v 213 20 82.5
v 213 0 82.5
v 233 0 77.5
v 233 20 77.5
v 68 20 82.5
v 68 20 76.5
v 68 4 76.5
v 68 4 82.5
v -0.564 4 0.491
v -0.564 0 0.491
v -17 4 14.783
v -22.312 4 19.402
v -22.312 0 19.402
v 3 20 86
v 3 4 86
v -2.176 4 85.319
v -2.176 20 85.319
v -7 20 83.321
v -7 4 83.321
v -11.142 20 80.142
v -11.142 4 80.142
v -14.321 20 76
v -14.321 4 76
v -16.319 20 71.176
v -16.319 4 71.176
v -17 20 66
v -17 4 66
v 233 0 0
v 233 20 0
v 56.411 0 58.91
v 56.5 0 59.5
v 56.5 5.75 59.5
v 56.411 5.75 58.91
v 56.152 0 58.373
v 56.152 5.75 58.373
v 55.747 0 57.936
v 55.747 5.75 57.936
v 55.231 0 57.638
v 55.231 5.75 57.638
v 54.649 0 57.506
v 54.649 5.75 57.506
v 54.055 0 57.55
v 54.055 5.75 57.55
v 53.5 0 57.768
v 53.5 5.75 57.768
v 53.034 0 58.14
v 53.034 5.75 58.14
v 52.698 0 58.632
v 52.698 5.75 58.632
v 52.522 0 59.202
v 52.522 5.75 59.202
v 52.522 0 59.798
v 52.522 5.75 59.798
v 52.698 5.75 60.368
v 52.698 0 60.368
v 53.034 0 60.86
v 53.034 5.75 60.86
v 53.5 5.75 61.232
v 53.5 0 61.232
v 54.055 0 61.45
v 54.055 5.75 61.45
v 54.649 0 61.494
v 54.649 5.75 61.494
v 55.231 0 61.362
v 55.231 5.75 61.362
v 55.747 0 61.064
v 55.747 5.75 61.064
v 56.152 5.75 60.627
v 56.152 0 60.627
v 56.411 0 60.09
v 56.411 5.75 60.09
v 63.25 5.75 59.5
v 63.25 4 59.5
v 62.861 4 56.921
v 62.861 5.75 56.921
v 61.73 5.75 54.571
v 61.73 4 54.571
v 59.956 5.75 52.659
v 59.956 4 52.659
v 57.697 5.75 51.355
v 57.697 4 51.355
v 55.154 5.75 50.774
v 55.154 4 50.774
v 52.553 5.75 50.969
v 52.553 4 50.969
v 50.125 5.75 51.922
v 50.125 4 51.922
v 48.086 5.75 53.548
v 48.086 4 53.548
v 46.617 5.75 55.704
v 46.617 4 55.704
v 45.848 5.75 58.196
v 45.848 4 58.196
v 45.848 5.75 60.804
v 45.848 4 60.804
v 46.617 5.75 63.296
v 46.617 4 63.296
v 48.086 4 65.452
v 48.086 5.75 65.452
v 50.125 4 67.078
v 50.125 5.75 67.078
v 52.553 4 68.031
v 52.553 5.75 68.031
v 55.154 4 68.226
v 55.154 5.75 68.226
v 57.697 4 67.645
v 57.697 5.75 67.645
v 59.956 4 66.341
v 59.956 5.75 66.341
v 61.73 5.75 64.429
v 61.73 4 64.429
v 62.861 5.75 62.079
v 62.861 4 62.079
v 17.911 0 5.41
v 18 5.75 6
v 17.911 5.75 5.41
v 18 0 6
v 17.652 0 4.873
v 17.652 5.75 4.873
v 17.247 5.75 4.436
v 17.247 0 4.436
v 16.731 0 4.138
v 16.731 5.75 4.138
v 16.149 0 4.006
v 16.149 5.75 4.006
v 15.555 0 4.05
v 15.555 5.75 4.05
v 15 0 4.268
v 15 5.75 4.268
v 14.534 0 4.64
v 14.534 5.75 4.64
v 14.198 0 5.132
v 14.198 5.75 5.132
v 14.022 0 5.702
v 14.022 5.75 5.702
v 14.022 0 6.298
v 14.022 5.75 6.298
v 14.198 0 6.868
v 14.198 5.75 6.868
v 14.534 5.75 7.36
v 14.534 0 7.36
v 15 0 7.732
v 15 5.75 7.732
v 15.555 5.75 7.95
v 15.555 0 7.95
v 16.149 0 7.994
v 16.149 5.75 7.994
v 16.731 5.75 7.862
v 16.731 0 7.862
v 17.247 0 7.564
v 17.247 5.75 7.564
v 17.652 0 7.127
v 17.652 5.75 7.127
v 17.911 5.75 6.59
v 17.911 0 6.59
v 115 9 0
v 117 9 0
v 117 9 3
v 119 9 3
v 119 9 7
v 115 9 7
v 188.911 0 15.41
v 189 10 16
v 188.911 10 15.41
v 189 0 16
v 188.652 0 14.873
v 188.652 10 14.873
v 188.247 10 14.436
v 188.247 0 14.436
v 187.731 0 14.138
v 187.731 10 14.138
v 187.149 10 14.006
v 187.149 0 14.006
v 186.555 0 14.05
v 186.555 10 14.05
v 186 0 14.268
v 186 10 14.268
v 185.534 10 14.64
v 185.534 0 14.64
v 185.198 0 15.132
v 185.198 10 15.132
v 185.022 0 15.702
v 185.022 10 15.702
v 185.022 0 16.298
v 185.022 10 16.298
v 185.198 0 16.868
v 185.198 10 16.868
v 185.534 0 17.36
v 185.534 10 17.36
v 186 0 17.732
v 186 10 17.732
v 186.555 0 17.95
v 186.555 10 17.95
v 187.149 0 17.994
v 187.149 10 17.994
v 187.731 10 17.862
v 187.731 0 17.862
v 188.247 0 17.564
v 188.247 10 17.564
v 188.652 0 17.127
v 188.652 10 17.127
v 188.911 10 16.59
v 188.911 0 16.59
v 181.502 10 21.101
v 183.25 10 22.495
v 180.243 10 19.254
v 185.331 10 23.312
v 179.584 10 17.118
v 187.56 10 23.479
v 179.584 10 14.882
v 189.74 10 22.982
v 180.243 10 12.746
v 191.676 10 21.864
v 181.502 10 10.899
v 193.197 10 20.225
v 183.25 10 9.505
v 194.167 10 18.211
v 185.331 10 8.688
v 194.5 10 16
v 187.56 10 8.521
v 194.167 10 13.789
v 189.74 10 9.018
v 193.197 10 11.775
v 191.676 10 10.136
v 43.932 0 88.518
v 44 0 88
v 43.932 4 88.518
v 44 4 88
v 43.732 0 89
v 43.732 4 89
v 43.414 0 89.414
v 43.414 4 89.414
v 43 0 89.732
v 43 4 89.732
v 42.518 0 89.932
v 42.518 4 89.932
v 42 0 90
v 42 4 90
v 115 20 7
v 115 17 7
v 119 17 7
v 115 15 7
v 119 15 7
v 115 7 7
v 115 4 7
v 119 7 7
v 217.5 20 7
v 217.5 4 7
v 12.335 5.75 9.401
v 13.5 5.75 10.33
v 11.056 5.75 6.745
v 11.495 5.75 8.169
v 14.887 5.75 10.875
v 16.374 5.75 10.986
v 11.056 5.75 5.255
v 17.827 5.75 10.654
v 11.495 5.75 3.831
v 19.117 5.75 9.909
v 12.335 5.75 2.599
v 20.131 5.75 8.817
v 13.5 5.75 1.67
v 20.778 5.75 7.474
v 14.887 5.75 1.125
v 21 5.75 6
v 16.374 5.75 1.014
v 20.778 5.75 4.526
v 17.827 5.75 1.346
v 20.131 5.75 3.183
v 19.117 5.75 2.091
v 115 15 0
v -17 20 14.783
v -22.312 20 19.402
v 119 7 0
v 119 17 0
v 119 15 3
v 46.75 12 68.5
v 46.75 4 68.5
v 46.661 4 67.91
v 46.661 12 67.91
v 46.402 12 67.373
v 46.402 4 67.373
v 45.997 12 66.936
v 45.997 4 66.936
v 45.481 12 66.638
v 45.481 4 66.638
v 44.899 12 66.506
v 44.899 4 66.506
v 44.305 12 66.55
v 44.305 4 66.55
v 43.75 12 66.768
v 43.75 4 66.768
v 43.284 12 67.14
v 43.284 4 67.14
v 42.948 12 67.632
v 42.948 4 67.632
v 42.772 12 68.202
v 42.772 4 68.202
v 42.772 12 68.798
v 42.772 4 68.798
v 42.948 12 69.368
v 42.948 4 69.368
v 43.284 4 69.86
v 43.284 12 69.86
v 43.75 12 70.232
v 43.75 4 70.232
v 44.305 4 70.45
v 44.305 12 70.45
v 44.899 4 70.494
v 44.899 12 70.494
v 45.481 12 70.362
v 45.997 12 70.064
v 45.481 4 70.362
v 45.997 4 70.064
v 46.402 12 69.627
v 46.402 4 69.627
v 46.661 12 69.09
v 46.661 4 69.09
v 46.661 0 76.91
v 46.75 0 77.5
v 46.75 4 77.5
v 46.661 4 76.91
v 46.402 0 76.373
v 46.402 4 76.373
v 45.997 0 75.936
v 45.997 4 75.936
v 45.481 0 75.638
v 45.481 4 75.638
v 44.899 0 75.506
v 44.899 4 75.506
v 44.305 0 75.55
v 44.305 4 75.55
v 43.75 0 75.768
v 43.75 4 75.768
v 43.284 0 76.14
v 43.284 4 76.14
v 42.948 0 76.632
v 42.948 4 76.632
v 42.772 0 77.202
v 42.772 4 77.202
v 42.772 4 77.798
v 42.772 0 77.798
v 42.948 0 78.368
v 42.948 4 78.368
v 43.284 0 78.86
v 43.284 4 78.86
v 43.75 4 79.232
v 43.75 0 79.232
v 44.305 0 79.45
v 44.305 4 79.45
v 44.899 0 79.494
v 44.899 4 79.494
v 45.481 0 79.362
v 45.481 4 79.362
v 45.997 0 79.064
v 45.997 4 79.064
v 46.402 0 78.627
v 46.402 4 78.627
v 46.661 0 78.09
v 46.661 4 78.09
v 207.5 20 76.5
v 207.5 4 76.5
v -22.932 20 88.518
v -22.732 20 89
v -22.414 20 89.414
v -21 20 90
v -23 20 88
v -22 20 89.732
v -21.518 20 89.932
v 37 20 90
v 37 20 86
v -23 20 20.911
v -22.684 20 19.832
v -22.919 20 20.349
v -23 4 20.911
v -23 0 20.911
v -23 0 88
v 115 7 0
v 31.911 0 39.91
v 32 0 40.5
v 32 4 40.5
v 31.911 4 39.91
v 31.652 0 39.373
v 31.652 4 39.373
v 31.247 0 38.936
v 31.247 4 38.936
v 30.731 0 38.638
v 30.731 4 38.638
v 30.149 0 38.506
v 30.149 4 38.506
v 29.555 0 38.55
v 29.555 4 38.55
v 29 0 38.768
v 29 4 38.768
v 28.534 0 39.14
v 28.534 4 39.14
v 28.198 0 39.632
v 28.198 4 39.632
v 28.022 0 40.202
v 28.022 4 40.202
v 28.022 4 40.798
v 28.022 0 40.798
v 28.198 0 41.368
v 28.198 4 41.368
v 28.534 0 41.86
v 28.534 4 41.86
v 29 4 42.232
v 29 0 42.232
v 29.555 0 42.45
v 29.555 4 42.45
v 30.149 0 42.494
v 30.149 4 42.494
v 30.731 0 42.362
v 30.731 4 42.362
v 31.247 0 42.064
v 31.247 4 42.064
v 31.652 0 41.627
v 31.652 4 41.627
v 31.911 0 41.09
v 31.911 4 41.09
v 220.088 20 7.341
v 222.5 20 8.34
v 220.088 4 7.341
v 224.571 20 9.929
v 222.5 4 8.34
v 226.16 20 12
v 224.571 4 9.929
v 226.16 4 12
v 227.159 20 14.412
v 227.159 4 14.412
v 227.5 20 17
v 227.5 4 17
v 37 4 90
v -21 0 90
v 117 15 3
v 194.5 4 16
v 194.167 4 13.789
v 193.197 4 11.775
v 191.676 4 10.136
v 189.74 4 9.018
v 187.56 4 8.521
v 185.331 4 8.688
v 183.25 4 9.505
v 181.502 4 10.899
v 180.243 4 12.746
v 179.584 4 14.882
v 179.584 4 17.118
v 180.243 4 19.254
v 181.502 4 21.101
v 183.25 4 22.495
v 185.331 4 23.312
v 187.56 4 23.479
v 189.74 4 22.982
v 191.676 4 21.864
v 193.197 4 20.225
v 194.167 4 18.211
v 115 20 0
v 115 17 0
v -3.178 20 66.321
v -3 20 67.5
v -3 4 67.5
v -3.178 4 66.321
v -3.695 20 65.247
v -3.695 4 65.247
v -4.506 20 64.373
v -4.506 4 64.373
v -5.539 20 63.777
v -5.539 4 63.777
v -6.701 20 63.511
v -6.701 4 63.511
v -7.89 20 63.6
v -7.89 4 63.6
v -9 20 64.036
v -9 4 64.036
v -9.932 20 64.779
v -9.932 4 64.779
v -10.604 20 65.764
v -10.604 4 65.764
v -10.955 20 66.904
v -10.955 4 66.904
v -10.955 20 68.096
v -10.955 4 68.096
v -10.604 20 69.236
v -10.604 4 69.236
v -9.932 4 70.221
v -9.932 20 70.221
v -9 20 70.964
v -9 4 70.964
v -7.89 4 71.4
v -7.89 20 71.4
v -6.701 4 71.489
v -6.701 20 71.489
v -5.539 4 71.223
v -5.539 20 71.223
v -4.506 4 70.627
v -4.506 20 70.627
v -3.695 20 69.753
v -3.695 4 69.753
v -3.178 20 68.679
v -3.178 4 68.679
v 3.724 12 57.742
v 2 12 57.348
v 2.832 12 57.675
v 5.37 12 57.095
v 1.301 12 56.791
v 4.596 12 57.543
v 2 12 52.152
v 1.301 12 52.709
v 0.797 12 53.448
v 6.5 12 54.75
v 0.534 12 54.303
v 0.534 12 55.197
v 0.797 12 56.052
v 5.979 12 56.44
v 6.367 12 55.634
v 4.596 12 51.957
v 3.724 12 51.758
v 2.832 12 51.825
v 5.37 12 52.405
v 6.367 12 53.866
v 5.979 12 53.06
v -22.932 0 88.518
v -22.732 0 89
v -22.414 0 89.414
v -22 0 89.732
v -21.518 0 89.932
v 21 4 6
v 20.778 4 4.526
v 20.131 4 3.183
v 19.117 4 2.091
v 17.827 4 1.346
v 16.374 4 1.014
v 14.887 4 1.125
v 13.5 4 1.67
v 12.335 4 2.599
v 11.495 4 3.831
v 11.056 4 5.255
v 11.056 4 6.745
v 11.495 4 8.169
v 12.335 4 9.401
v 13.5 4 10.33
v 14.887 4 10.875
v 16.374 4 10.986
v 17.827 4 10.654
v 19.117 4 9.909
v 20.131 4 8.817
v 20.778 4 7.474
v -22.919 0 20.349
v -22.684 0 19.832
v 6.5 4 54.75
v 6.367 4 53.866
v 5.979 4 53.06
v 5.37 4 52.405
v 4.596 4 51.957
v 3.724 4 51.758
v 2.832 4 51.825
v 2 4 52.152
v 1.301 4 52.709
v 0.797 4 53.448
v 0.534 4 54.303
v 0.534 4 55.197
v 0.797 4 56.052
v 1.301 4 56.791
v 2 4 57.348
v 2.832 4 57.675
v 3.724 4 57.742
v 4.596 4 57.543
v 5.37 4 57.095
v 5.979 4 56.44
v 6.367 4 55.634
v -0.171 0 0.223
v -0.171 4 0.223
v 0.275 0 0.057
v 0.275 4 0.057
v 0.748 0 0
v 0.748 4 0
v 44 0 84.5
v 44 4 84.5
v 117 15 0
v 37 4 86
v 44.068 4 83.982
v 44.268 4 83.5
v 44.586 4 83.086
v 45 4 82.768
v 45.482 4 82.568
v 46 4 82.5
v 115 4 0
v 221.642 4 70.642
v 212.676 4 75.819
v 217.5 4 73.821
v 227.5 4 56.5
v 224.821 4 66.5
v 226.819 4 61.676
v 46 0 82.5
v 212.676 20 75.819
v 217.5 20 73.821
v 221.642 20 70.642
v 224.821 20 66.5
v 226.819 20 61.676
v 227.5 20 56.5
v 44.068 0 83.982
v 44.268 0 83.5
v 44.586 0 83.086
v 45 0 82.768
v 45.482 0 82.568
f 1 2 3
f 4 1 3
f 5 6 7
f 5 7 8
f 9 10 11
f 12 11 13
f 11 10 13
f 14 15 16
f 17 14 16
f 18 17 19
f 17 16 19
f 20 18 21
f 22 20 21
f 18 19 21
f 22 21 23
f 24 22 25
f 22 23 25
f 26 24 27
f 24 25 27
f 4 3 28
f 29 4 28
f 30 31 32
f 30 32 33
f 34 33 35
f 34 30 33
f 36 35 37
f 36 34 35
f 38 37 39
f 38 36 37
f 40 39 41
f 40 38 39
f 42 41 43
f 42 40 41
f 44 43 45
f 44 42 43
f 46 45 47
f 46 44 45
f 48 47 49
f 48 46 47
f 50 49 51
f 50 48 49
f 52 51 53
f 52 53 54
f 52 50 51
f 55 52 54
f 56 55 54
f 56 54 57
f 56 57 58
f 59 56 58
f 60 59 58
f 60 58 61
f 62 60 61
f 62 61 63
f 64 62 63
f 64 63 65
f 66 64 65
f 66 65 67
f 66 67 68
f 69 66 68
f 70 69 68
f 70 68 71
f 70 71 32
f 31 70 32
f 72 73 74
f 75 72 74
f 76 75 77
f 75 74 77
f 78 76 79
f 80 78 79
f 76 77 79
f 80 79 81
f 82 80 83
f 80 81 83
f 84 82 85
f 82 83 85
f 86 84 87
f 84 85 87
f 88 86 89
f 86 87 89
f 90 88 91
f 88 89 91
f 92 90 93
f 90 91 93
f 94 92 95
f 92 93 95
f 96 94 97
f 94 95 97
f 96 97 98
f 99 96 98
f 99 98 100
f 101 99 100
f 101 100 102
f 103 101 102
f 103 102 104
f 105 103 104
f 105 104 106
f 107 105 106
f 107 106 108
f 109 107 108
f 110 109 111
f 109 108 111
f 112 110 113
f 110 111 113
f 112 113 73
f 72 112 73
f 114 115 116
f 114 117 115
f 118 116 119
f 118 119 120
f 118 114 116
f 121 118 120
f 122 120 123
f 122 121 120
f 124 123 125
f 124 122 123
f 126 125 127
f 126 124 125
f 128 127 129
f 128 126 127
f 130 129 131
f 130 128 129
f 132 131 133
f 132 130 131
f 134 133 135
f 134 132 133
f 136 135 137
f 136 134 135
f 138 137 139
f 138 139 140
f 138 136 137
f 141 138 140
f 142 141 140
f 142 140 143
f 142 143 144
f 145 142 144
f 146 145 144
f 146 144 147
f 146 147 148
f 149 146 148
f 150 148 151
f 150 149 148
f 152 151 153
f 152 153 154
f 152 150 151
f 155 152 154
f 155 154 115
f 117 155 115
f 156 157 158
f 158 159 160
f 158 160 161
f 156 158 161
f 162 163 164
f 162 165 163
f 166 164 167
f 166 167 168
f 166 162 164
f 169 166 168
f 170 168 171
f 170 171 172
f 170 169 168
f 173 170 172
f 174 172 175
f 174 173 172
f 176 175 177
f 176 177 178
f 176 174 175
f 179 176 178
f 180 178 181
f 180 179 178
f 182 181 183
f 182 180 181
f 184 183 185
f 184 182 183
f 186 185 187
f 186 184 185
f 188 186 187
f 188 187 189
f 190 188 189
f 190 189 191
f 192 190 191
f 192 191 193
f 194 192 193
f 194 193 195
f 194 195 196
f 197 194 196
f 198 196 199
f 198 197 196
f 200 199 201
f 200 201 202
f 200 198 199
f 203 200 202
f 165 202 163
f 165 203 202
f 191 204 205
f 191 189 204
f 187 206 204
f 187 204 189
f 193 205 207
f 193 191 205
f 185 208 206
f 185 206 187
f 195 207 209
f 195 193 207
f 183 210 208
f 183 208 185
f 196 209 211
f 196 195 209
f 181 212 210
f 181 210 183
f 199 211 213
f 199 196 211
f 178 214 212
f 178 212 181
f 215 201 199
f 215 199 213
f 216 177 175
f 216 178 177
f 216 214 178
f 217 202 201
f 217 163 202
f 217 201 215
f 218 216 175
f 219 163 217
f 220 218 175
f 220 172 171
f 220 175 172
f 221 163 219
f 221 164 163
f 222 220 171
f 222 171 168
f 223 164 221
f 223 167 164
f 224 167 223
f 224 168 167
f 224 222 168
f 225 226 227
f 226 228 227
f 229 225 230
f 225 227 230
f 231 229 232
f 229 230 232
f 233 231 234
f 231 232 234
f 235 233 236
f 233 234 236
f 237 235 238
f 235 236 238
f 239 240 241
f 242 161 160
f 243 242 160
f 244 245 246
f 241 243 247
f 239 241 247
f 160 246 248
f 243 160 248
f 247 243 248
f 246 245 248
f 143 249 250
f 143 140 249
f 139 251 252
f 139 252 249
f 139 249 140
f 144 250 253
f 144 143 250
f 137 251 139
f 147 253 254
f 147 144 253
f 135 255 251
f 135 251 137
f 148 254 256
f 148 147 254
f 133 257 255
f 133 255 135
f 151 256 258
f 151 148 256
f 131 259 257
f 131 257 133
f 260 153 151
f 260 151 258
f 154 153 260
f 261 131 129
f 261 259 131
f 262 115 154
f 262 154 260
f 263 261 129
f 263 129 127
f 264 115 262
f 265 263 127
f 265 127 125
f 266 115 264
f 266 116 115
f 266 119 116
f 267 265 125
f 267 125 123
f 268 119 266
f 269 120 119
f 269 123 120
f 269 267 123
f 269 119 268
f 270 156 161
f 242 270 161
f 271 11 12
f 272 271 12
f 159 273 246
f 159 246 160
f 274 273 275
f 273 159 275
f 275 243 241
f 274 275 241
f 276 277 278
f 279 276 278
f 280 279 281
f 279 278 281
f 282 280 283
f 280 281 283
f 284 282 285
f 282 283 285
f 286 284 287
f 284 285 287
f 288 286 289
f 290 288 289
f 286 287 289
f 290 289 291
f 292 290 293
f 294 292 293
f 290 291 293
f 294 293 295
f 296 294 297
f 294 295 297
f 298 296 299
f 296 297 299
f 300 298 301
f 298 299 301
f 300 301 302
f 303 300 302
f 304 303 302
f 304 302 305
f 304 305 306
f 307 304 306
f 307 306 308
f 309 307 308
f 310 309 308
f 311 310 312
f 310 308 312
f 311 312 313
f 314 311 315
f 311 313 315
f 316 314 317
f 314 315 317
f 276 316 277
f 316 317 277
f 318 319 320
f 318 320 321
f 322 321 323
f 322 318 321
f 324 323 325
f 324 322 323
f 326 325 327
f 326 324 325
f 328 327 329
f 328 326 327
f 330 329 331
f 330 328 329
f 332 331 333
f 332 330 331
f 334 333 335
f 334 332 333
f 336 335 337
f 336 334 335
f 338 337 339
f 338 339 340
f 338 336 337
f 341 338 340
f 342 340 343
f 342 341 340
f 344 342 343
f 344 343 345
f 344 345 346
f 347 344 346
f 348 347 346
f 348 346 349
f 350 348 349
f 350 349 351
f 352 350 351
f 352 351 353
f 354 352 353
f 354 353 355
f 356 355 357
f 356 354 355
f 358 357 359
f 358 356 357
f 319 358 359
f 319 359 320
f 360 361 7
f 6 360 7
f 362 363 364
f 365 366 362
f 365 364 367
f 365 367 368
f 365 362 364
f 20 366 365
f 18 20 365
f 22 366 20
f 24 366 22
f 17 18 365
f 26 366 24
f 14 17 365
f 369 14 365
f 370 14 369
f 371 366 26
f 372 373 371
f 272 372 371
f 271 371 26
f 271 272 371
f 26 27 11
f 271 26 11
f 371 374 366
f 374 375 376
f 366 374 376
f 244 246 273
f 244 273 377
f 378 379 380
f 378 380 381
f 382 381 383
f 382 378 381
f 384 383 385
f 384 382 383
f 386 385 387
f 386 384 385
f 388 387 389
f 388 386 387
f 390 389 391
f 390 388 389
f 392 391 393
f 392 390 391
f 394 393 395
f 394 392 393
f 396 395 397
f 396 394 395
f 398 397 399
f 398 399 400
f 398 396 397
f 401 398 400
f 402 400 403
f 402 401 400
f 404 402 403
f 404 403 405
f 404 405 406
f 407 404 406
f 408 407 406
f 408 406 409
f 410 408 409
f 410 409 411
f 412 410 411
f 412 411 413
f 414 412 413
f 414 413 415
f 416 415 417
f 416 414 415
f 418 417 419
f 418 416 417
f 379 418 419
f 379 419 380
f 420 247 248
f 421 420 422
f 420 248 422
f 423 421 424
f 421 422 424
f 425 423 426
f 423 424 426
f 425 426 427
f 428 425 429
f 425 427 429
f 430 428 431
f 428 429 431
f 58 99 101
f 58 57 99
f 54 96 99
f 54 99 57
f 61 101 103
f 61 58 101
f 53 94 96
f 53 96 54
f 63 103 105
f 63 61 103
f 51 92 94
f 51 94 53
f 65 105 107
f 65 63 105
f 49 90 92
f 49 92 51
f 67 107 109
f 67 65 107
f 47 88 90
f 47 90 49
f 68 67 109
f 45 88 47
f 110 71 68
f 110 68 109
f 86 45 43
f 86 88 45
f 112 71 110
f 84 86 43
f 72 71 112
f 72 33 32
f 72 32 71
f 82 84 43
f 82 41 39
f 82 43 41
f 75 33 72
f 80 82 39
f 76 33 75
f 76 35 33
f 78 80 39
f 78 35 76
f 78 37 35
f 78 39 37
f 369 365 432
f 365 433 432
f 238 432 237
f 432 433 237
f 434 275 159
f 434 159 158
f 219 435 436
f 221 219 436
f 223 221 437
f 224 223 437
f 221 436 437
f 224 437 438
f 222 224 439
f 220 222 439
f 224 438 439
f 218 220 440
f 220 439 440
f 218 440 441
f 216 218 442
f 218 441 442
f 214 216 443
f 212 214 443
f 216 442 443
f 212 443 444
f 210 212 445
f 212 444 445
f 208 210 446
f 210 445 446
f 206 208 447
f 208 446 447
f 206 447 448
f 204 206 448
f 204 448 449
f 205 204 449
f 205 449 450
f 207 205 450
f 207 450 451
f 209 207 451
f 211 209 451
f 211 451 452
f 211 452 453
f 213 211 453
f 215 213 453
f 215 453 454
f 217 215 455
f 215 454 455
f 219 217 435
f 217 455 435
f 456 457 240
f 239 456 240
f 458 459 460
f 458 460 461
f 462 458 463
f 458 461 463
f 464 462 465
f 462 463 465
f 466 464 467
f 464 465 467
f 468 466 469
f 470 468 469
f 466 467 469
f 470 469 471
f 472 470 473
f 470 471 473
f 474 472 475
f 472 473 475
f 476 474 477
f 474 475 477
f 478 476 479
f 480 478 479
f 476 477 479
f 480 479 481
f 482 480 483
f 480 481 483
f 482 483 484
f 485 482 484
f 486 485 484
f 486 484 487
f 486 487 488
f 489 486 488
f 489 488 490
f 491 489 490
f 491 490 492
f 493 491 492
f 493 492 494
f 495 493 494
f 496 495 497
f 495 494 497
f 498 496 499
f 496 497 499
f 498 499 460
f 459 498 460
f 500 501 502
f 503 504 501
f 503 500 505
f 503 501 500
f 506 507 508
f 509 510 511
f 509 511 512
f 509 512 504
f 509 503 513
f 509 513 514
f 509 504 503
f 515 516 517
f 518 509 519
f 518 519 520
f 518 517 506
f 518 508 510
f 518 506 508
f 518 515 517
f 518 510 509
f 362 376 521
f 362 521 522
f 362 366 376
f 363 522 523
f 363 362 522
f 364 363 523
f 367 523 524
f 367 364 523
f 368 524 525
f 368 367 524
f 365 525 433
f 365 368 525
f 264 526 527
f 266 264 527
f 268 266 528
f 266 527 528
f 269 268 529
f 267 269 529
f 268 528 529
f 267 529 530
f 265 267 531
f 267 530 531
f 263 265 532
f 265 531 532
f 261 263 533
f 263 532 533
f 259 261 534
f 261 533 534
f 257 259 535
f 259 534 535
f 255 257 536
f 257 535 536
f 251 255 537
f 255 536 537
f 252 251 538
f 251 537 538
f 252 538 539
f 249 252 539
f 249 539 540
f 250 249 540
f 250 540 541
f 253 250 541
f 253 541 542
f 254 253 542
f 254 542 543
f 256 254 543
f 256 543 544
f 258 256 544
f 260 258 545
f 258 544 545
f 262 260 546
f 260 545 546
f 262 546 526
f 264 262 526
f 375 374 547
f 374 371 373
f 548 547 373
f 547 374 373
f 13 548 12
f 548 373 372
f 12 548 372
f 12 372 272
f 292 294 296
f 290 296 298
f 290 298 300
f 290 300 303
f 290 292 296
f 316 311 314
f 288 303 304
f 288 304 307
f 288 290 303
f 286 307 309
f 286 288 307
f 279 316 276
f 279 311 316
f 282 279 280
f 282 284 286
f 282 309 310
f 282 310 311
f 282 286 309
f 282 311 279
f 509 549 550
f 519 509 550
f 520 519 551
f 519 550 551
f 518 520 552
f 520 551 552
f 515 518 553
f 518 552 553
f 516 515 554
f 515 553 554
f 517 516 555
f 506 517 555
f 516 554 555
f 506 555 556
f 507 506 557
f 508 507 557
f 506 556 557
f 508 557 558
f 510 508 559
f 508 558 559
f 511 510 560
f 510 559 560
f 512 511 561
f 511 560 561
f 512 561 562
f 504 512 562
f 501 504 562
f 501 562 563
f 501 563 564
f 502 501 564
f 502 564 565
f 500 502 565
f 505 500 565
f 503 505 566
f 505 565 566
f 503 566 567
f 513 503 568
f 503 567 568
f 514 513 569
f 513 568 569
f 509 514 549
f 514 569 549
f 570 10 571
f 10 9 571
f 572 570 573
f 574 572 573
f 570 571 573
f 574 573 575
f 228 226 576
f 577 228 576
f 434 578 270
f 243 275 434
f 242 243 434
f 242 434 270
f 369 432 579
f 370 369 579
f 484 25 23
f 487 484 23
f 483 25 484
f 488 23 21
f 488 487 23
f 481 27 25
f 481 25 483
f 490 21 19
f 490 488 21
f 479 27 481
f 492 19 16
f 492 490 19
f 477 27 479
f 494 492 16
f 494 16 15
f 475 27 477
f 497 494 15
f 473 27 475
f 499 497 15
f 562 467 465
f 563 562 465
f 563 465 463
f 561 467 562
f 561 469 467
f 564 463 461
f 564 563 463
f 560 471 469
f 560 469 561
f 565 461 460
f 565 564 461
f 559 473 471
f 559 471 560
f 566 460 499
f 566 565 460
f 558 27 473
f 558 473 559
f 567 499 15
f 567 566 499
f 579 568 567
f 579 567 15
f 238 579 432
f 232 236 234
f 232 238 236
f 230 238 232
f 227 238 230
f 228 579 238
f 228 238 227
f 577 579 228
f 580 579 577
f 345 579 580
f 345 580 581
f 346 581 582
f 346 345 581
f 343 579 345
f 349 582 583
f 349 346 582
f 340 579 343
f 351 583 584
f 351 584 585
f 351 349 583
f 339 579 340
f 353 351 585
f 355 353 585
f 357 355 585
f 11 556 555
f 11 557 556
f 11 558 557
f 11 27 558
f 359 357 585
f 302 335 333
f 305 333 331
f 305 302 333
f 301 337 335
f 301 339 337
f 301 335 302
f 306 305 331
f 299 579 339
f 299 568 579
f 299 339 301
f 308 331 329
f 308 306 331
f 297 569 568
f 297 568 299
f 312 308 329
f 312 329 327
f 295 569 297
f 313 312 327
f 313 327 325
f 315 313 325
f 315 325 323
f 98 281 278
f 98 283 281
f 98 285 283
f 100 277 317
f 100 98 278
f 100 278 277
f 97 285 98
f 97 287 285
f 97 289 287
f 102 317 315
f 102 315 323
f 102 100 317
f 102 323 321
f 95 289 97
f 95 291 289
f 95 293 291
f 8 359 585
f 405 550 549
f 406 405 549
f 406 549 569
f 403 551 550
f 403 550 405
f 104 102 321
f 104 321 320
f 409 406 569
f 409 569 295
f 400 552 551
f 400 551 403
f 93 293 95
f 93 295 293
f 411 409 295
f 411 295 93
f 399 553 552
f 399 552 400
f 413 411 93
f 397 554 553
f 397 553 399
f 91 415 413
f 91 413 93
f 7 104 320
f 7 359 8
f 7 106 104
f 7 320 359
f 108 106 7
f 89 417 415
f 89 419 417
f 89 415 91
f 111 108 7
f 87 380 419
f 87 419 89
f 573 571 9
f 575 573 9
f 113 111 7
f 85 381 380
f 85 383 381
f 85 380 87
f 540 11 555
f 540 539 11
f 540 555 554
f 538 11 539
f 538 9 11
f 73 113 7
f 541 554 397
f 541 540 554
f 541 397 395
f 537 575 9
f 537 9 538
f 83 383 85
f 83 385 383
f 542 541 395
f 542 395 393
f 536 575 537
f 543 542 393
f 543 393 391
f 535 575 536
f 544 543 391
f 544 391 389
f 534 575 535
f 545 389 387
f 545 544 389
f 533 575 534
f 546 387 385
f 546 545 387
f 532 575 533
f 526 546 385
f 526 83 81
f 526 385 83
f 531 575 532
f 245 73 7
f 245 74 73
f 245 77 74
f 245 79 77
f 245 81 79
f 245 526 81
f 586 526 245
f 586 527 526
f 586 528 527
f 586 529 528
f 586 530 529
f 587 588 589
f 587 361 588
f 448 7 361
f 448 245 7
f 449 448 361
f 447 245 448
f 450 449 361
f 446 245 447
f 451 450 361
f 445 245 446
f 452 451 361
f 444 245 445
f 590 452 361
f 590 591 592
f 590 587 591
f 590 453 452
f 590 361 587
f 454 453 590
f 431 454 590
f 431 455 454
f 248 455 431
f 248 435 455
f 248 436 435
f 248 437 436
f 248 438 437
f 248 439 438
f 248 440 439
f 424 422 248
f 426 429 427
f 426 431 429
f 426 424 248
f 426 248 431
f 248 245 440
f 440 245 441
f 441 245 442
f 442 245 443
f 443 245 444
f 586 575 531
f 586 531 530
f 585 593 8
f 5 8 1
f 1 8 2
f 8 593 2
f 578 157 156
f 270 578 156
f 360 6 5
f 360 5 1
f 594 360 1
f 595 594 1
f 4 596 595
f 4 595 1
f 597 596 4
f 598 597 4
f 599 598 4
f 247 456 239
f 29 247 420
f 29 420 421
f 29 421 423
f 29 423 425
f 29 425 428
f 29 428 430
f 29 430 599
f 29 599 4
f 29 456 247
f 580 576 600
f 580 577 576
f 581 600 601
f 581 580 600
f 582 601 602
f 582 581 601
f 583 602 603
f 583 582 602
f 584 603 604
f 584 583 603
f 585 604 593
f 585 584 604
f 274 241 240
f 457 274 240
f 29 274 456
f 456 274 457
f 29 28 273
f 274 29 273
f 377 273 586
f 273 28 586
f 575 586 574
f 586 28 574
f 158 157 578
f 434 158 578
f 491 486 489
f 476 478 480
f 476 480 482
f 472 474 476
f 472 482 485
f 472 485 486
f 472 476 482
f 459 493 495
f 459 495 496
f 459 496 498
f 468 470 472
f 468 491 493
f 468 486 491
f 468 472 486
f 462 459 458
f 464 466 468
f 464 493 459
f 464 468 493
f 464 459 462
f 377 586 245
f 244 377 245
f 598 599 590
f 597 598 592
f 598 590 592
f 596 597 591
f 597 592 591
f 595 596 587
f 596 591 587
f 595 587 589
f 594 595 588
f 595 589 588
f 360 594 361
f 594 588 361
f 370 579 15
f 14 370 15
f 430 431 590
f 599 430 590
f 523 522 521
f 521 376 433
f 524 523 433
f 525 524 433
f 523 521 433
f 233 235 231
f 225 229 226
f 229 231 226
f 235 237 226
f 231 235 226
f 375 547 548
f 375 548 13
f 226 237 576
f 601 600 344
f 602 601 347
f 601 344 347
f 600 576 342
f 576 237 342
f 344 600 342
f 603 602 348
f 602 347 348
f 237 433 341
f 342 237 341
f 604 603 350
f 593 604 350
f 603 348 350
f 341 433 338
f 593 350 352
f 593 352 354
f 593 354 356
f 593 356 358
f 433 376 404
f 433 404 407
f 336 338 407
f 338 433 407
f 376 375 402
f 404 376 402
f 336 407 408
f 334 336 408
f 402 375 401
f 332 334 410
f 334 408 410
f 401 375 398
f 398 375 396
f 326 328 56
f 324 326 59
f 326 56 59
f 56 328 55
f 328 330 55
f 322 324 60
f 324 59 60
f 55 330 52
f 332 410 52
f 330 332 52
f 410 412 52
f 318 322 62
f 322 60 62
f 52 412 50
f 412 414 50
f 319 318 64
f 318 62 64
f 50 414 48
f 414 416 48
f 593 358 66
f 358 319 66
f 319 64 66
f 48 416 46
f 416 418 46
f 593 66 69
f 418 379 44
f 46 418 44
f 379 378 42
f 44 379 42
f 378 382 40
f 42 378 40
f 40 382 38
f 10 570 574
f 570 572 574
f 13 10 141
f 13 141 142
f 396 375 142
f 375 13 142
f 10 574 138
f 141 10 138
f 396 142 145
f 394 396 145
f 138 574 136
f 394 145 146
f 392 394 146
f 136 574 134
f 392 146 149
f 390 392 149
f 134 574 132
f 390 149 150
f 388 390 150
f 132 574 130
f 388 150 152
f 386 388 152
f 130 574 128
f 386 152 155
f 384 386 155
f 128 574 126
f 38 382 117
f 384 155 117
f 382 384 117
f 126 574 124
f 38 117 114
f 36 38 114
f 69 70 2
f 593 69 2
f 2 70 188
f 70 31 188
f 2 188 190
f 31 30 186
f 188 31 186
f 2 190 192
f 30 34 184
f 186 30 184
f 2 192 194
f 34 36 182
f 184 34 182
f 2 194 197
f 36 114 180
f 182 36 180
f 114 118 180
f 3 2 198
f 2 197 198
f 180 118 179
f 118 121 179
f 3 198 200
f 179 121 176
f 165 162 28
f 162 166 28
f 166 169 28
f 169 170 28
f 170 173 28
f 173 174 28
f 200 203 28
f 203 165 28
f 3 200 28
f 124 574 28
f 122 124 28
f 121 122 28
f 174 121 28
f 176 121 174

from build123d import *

# Parameters (mm, degrees)
SKETCH1_R               = 2
PRIMARY_DEPTH           = 4
SKETCH3_R               = 3
SKETCH3_R_2             = 2
STOP_EXT_DEPTH          = 8
FRONT_EXT_DEPTH         = 16
CUT_EXTRUDE1_START      = -7
SKETCH5_W               = 4
SKETCH5_H               = 2
CUT_EXTRUDE1_DEPTH      = 8
SKETCH6_W               = 2
SKETCH6_H               = 6
CUT_EXTRUDE2_DEPTH      = 3
SKETCH7_R               = 7.5
SKETCH7_R_2             = 2
SWINGYBIT_PIN_EXT_DEPTH = 6
SKETCH8_R               = 5
SKETCH8_R_2             = 2
SKETCH8_R_3             = 8.75
WHEEL_PIN_EXT_DEPTH     = 1.75
BOTTOM_EXT_DEPTH        = 16
FILLET1_R               = 2
SKETCH10_R              = 4
POST_EXT_DEPTH          = 16


with BuildPart() as part:
    # Sketch1 → Primary (new body)
    with BuildSketch(Plane(origin=(0, 0, 0), x_dir=(1, 0, 0), z_dir=(0, 1, 0))):
        Polygon((0, 0), (-23, -20), (-23, -90), (44, -90), (44, -82.5), (213, -82.5), (233, -77.5), (233, 0), align=None)
        with Locations((16, -6)):
            Circle(SKETCH1_R, mode=Mode.SUBTRACT)
        with Locations((30, -40.5)):
            Circle(SKETCH1_R, mode=Mode.SUBTRACT)
        with Locations((54.5, -59.5)):
            Circle(SKETCH1_R, mode=Mode.SUBTRACT)
        with Locations((44.75, -77.5)):
            Circle(SKETCH1_R, mode=Mode.SUBTRACT)
        with Locations((187, -16)):
            Circle(SKETCH1_R, mode=Mode.SUBTRACT)
    extrude(amount=PRIMARY_DEPTH)

    # Sketch3 → Stop Ext (add)
    with BuildSketch(Plane(origin=(0, 4, 0), x_dir=(1, 0, 0), z_dir=(0, 1, 0))):
        with Locations((3.5, -54.75)):
            Circle(SKETCH3_R)
        with Locations((44.75, -68.5)):
            Circle(SKETCH3_R_2)
    extrude(amount=STOP_EXT_DEPTH)

    # Sketch4 → Front Ext (add)
    with BuildSketch(Plane(origin=(0, 4, 0), x_dir=(1, 0, 0), z_dir=(0, 1, 0))):
        with BuildLine():
            Line((233, 0), (115, 0))
            Line((115, 0), (115, -7))
            Line((115, -7), (217.5, -7))
            ThreePointArc((217.5, -7), (224.571067812, -9.928932188), (227.5, -17))
            Line((227.5, -17), (227.5, -56.5))
            ThreePointArc((227.5, -56.5), (221.642135624, -70.642135624), (207.5, -76.5))
            Line((207.5, -76.5), (68, -76.5))
            Line((68, -76.5), (68, -82.5))
            Line((68, -82.5), (213, -82.5))
            Line((213, -82.5), (233, -77.5))
            Line((233, -77.5), (233, 0))
        make_face()
    extrude(amount=FRONT_EXT_DEPTH)

    # Sketch5 → Cut-Extrude1 (cut, through all)
    with BuildSketch(Plane(origin=(0, 0, 0), x_dir=(-1, 0, 0), z_dir=(0, 0, -1)).offset(CUT_EXTRUDE1_START)):
        with Locations((-117, 8)):
            Rectangle(SKETCH5_W, SKETCH5_H)
        with Locations((-117, 16)):
            Rectangle(SKETCH5_W, SKETCH5_H)
    extrude(amount=CUT_EXTRUDE1_DEPTH, mode=Mode.SUBTRACT)

    # Sketch6 → Cut-Extrude2 (cut)
    with BuildSketch(Plane(origin=(0, 0, 0), x_dir=(-1, 0, 0), z_dir=(0, 0, -1))):
        with Locations((-118, 12)):
            Rectangle(SKETCH6_W, SKETCH6_H)
    extrude(amount=-CUT_EXTRUDE2_DEPTH, mode=Mode.SUBTRACT)

    # Sketch7 → Swingybit_Pin Ext (add)
    with BuildSketch(Plane(origin=(0, 4, 0), x_dir=(1, 0, 0), z_dir=(0, 1, 0))):
        with Locations((187, -16)):
            Circle(SKETCH7_R)
        with Locations((187, -16)):
            Circle(SKETCH7_R_2, mode=Mode.SUBTRACT)
    extrude(amount=SWINGYBIT_PIN_EXT_DEPTH)

    # Sketch8 → Wheel_Pin Ext (add)
    with BuildSketch(Plane(origin=(0, 4, 0), x_dir=(1, 0, 0), z_dir=(0, 1, 0))):
        with Locations((16, -6)):
            Circle(SKETCH8_R)
        with Locations((16, -6)):
            Circle(SKETCH8_R_2, mode=Mode.SUBTRACT)
        with Locations((54.5, -59.5)):
            Circle(SKETCH8_R_3)
        with Locations((54.5, -59.5)):
            Circle(SKETCH8_R_2, mode=Mode.SUBTRACT)
    extrude(amount=WHEEL_PIN_EXT_DEPTH)

    # Sketch9 → Bottom Ext (add)
    with BuildSketch(Plane(origin=(0, 4, 0), x_dir=(1, 0, 0), z_dir=(0, 1, 0))):
        with BuildLine():
            Line((-23, -20), (-23, -86))
            Line((-23, -86), (-23, -90))
            Line((-23, -90), (37, -90))
            Line((37, -90), (37, -86))
            Line((37, -86), (3, -86))
            ThreePointArc((3, -86), (-11.142135624, -80.142135624), (-17, -66))
            Line((-17, -66), (-17, -14.782608696))
            Line((-17, -14.782608696), (-23, -20))
        make_face()
    extrude(amount=BOTTOM_EXT_DEPTH)

    # Fillet1
    fillet1_edges = [part.edges().sort_by_distance(p)[0] for p in [
        (44, 2, 82.5),
        (0, 2, 0),
        (-23, 10, 20),
        (-23, 10, 90),
        (44, 2, 90),
    ]]
    fillet(fillet1_edges, radius=FILLET1_R)

    # Sketch10 → Post Ext (add)
    with BuildSketch(Plane(origin=(0, 4, 0), x_dir=(1, 0, 0), z_dir=(0, 1, 0))):
        with Locations((-7, -67.5)):
            Circle(SKETCH10_R)
    extrude(amount=POST_EXT_DEPTH)


solid = part.part
